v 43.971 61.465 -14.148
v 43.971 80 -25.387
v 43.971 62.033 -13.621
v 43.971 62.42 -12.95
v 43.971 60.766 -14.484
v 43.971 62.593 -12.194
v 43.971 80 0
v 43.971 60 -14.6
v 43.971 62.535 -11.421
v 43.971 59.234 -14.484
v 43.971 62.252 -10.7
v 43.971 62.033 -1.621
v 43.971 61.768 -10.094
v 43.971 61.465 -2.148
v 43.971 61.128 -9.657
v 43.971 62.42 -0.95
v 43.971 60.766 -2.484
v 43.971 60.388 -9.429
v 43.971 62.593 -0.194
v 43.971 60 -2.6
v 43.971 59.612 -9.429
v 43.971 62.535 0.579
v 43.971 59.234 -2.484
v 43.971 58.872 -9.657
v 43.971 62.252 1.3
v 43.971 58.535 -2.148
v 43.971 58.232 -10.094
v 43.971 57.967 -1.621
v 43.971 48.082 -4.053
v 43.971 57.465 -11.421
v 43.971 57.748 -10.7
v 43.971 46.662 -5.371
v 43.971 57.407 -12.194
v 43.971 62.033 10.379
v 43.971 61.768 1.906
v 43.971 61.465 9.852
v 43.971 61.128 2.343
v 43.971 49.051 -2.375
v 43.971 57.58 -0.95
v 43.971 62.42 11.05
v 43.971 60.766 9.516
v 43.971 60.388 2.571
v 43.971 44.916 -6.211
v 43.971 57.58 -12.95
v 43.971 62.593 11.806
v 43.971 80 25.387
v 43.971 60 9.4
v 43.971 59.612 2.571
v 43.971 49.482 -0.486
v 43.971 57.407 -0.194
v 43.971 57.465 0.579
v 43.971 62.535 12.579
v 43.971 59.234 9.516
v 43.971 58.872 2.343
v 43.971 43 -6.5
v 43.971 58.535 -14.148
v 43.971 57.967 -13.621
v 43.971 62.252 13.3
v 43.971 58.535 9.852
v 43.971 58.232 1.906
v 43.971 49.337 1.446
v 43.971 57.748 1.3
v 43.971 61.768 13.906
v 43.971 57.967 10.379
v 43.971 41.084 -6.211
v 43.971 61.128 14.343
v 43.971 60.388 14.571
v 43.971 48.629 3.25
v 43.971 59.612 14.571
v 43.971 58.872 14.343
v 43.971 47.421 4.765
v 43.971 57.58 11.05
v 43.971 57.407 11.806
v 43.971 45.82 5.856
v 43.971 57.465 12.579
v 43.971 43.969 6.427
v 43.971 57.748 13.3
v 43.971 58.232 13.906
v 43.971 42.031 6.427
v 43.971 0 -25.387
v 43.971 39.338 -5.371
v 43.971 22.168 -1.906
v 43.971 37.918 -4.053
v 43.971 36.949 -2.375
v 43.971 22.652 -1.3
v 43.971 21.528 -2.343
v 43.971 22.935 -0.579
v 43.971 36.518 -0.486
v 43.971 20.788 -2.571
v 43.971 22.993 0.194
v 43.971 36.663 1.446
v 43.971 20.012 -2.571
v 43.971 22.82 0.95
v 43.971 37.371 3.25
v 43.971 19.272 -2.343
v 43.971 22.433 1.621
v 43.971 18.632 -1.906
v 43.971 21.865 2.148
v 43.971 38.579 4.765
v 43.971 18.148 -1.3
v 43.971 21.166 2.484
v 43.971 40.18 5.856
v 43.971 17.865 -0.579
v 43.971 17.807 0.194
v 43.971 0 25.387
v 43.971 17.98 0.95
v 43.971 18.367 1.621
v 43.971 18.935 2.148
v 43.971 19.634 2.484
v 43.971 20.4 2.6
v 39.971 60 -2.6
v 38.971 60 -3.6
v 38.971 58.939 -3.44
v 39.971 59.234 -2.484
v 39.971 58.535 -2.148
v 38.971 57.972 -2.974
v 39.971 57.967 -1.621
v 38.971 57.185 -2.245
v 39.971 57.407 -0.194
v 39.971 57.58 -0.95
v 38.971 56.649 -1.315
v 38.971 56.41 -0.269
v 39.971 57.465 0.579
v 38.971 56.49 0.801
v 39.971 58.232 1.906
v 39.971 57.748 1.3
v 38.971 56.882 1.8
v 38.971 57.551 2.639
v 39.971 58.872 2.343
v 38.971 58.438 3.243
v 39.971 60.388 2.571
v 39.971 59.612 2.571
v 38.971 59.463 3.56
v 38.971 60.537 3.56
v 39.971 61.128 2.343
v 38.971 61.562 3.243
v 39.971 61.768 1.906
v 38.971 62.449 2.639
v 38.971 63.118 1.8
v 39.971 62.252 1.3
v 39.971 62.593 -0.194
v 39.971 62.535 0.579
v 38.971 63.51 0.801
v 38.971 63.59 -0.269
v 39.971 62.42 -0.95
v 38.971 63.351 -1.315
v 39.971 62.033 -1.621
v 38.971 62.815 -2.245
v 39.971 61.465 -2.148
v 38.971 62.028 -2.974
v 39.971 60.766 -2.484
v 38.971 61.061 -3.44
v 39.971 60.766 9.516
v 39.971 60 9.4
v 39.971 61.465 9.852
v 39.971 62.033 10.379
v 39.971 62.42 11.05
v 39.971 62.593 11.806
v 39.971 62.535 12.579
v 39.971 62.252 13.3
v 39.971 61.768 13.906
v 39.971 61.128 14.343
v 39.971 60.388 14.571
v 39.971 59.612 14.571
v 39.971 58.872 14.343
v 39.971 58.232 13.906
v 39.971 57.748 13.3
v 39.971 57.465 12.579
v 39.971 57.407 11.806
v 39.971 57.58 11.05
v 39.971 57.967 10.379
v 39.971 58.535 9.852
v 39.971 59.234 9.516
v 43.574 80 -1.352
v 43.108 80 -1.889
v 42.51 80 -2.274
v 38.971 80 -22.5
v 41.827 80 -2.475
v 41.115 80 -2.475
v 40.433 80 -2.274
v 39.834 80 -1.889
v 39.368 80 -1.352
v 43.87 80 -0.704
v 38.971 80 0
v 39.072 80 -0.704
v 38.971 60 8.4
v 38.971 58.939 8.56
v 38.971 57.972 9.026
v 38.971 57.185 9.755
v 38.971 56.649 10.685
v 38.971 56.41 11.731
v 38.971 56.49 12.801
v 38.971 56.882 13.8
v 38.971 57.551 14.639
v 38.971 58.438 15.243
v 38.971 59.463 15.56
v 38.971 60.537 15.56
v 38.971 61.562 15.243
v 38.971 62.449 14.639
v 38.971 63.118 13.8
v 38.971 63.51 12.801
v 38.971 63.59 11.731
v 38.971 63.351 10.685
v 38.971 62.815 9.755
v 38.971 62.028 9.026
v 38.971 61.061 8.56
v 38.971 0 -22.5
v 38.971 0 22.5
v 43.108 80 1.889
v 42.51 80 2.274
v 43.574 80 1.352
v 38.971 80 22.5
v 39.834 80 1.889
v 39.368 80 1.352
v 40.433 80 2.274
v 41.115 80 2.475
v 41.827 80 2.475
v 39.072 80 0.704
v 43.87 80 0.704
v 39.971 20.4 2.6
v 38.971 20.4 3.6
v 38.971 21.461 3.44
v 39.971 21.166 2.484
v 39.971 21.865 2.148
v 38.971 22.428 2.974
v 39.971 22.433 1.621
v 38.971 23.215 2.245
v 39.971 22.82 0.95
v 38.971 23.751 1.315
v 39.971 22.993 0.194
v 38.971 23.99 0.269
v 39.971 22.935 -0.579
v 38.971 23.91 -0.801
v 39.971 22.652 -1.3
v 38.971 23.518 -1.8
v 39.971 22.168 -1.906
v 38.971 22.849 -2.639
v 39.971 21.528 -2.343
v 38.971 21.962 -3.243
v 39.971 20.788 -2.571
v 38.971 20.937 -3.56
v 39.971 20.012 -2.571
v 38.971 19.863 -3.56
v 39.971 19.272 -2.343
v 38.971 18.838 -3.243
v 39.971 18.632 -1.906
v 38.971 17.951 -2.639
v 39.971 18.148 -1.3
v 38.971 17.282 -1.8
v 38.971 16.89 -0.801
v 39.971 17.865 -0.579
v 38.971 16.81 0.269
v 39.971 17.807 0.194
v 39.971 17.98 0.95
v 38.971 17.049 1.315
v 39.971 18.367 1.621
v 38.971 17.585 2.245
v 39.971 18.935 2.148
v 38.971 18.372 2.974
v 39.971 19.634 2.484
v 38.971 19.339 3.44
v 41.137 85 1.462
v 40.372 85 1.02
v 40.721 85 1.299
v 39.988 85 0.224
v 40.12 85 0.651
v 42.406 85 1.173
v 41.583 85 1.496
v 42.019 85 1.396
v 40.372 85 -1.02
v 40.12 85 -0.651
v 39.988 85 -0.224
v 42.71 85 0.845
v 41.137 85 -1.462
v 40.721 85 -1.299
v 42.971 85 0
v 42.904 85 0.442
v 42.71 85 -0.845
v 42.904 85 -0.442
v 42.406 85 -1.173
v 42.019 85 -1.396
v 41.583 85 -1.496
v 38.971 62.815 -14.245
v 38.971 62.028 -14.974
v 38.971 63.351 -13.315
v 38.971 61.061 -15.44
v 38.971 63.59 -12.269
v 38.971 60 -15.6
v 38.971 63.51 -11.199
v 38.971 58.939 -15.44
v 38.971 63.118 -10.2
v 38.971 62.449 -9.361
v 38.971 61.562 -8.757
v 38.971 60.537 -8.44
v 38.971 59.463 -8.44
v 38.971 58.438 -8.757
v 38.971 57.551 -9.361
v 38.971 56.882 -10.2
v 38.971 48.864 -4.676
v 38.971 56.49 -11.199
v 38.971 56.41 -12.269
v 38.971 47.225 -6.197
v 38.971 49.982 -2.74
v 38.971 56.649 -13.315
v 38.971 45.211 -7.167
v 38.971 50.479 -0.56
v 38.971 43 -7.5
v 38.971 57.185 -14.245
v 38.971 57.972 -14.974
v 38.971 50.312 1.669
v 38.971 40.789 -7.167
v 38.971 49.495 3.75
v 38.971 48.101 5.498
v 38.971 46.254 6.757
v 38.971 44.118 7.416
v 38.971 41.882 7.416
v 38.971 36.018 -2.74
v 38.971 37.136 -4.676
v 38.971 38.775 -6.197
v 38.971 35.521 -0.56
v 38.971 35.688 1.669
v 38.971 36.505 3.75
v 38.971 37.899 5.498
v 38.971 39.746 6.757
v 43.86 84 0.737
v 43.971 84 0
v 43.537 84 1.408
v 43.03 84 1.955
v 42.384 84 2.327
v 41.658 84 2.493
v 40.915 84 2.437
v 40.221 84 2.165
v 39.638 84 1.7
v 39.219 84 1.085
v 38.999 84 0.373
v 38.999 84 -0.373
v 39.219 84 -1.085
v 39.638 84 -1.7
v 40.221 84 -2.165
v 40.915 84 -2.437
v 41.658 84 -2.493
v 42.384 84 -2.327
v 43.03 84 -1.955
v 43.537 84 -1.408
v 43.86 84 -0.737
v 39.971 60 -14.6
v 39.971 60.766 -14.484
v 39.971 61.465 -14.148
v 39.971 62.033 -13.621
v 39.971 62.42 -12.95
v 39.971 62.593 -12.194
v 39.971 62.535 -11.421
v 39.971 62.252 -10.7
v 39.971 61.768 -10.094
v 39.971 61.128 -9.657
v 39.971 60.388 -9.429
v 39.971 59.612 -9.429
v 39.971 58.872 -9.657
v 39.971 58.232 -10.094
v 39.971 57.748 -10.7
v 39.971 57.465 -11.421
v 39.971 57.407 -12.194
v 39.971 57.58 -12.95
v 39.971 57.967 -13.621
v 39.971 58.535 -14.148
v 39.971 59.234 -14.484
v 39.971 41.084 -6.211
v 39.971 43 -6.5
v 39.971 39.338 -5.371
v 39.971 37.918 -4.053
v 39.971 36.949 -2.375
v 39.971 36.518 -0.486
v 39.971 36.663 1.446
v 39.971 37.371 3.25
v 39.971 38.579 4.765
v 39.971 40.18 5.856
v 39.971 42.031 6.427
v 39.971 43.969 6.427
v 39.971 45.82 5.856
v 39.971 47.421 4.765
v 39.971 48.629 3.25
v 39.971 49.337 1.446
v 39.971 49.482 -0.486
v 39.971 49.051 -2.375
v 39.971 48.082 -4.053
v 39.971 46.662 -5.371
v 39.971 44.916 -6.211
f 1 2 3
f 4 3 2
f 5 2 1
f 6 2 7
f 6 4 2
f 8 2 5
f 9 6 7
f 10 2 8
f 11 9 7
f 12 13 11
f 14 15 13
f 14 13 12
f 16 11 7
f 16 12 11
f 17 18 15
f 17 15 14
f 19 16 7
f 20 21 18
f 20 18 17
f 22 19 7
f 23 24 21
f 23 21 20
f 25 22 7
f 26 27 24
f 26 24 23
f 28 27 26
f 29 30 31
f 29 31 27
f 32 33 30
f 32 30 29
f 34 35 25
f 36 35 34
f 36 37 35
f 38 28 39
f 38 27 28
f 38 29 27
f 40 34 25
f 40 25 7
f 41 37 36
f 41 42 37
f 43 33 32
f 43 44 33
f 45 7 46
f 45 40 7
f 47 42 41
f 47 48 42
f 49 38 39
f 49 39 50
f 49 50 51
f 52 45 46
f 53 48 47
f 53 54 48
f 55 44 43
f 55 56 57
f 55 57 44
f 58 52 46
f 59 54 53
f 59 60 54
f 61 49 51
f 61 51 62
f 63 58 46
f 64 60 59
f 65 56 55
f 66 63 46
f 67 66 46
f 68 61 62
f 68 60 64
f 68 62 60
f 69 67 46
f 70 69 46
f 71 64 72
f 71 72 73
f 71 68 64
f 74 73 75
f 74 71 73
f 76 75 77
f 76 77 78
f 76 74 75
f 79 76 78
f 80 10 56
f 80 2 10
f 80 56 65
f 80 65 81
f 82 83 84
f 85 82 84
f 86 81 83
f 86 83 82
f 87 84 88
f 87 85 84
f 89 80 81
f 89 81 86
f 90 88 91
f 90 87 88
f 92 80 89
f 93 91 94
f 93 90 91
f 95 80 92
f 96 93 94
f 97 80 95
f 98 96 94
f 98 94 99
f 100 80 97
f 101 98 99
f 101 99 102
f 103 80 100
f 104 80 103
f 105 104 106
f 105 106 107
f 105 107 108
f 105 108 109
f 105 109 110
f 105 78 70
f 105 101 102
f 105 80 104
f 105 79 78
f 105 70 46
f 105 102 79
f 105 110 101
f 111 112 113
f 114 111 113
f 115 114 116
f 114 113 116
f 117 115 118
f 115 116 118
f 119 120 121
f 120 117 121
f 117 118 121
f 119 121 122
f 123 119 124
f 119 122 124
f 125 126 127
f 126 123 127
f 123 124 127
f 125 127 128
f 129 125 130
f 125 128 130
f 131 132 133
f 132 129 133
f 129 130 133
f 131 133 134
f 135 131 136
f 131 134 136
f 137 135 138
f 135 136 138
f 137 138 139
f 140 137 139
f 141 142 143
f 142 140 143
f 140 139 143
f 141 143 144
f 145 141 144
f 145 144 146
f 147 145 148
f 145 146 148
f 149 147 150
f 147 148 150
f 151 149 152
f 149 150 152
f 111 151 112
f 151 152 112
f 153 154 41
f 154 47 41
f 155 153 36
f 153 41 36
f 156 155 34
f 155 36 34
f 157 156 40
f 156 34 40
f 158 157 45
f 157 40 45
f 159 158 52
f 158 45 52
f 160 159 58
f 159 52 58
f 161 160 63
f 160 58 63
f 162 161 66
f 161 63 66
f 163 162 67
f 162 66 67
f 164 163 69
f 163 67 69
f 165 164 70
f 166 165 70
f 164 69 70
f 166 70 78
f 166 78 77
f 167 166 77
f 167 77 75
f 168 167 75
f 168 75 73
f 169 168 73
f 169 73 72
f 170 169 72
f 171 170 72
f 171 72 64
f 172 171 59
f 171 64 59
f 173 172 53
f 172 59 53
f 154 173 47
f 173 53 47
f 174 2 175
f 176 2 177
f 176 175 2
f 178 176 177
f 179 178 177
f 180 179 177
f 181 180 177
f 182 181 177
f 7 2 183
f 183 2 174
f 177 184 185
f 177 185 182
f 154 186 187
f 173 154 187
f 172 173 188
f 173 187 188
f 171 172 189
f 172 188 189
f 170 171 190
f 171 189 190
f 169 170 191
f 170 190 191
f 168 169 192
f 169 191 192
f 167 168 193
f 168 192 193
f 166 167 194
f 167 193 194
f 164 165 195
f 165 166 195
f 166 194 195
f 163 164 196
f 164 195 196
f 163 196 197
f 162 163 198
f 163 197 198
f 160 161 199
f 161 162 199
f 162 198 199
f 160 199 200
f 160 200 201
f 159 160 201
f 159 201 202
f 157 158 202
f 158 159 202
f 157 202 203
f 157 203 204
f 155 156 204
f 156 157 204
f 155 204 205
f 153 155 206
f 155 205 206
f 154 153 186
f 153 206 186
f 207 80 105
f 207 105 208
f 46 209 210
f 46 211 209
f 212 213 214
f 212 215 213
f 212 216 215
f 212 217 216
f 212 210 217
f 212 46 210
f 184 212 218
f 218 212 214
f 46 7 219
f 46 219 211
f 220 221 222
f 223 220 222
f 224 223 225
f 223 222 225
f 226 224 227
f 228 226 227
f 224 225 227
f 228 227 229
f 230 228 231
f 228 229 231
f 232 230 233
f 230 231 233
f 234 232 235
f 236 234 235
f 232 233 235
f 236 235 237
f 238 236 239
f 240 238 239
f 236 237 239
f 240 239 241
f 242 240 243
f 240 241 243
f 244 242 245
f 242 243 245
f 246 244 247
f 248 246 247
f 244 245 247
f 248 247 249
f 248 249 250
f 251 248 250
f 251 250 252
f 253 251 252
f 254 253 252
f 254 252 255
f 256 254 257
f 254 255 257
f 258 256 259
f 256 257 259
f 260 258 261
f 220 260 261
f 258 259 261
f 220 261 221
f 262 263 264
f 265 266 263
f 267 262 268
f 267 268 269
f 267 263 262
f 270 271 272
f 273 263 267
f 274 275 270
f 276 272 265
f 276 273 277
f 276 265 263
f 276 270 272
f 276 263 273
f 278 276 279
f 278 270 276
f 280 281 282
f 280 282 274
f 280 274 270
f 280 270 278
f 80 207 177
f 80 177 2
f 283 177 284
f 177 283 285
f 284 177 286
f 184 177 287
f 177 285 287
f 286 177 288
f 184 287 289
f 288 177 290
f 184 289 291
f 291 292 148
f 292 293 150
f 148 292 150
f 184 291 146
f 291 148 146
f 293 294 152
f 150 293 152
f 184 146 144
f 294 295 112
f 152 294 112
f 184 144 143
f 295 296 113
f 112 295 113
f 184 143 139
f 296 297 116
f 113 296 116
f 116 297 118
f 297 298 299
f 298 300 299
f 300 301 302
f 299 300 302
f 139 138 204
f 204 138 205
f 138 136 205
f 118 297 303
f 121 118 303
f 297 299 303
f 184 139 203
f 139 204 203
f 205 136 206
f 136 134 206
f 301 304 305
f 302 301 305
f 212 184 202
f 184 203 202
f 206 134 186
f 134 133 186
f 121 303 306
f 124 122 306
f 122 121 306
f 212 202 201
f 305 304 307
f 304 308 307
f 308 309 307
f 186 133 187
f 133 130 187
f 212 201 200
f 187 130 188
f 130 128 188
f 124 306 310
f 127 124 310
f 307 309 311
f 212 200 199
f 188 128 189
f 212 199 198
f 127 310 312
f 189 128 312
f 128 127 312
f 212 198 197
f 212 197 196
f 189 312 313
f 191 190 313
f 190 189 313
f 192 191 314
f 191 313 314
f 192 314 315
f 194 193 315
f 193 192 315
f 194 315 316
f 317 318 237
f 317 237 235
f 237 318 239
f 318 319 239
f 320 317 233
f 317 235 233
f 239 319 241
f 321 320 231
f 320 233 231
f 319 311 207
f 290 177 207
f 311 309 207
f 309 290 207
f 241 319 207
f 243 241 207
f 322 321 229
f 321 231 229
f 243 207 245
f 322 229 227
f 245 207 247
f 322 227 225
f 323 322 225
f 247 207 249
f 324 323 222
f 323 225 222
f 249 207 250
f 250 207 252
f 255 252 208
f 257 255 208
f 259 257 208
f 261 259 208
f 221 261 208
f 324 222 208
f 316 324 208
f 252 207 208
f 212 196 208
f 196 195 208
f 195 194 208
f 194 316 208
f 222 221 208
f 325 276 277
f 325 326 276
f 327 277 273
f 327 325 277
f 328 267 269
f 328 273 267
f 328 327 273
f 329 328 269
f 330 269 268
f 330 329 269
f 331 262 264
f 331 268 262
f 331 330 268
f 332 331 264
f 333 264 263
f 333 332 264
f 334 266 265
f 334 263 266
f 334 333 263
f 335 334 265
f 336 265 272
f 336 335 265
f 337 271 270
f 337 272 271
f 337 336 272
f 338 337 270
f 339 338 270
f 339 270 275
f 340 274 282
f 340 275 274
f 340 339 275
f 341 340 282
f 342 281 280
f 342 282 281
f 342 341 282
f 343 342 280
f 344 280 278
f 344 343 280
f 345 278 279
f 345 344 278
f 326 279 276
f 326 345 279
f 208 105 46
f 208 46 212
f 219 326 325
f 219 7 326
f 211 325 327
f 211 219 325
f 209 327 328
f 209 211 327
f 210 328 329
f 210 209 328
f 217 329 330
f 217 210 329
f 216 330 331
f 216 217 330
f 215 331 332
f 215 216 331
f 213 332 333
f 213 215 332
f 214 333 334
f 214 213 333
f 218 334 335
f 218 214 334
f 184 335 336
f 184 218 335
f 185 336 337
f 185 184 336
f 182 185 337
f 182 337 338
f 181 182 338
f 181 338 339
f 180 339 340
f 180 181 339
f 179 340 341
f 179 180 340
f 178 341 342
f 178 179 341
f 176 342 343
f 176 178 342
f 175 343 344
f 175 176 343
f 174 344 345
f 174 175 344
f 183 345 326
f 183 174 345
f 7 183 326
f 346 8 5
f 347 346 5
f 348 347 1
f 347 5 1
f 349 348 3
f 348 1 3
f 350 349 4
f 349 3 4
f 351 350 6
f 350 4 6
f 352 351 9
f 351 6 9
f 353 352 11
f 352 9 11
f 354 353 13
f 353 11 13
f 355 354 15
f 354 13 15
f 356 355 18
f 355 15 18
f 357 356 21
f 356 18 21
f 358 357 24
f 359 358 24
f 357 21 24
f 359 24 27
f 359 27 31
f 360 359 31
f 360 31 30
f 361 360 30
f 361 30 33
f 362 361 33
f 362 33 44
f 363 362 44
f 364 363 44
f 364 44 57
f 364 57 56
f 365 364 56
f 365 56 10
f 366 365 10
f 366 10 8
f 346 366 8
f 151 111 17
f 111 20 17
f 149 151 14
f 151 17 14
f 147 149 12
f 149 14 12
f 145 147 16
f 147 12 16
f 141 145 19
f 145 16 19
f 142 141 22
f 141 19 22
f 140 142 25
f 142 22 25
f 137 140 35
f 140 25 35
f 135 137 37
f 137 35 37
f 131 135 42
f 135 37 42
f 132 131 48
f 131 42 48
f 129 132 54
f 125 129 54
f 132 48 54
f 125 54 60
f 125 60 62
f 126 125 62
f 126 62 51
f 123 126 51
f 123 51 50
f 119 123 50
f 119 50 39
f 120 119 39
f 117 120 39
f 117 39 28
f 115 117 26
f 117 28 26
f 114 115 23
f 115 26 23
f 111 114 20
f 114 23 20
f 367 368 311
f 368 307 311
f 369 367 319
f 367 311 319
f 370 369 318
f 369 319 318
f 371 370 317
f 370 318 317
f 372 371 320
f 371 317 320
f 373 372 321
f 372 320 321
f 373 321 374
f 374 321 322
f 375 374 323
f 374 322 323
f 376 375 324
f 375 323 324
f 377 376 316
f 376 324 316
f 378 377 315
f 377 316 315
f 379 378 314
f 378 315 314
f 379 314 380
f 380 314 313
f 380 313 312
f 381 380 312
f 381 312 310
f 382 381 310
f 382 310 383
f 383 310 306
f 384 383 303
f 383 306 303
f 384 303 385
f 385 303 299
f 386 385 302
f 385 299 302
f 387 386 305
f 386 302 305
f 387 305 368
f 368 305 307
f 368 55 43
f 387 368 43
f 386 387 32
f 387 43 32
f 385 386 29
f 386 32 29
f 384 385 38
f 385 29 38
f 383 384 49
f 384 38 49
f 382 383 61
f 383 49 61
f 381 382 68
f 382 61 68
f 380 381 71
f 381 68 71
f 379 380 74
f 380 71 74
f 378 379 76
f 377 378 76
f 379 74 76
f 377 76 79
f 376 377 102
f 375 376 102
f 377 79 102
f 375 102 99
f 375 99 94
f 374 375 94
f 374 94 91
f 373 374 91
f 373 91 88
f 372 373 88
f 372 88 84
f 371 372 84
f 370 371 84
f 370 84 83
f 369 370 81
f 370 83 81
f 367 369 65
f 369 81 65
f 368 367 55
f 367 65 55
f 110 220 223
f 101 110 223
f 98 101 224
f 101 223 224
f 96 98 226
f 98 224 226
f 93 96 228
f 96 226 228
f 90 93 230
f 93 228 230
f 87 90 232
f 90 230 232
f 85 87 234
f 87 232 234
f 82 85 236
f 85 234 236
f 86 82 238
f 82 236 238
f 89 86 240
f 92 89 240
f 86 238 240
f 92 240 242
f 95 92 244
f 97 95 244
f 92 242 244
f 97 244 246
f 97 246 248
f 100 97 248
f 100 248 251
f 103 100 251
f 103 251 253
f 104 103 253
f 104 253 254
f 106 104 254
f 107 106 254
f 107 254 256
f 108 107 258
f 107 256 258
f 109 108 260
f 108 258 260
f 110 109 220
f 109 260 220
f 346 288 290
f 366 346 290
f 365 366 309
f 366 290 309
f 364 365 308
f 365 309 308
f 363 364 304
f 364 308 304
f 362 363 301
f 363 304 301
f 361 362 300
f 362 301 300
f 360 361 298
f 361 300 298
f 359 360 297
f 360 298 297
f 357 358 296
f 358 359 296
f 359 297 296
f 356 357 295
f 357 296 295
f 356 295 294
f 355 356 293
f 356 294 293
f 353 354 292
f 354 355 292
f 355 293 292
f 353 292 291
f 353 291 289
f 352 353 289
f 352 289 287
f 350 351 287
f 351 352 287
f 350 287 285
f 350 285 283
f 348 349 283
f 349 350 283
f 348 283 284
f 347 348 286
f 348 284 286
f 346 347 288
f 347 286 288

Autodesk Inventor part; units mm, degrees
ref_plane "YZ Plane" through (0, 0, 0) normal (1, 0, 0) x (0, 1, 0)
ref_plane "XZ Plane" through (0, 0, 0) normal (0, 1, 0) x (-1, 0, 0)
ref_plane "XY Plane" through (0, 0, 0) normal (0, 0, 1) x (1, 0, 0)
sketch "스케치2" plane through (0, 0, 0) normal (0, 1, 0) x (-1, 0, 0)
  line L0 (0, 45) -> (38.9711, 22.5)
  line L1 (38.9711, 22.5) -> (38.9711, -22.5)
  line L2 (38.9711, -22.5) -> (0, -45)
  line L3 (0, -45) -> (-38.9711, -22.5)
  line L4 (-38.9711, -22.5) -> (-38.9711, 22.5)
  line L5 (-38.9711, 22.5) -> (0, 45)
  line L6 (0, 50.7735) -> (43.9711, 25.3868)
  line L7 (43.9711, 25.3868) -> (43.9711, -25.3868)
  line L8 (43.9711, -25.3868) -> (0, -50.7735)
  line L9 (0, -50.7735) -> (-43.9711, -25.3868)
  line L10 (-43.9711, -25.3868) -> (-43.9711, 25.3868)
  line L11 (-43.9711, 25.3868) -> (0, 50.7735)
  line L12 (-43.9711, 25.3868) -> (-38.9711, 22.5)
  line L13 (-38.9711, -22.5) -> (-43.9711, -25.3868)
  point P0 (0, 0)
  point P1 (0, 0)
  dimension "d0" = 45
  dimension "d1" = 5
extrude "돌출1" add sketch "스케치2" along normal blind 80 contours L4 L13 L10 L12
sketch "스케치3" plane through (38.9711, 0, -22.5) normal (-1, 0, 0) x (0, 0, 1)
  line L0 (0, 0) -> (45, 0) construction
  circle A0 centre (22.5, 20.4) radius 2.6
  point P0 (22.5, 0)
  point P1 (22.5, 0)
  dimension "d4" = 5.2
  dimension "d5" = 20.4
extrude "돌출2" cut sketch "스케치3" against normal through all
sketch "스케치4" plane through (0, 80, 0) normal (0, 1, 0) x (1, 0, 0)
  line L0 (38.9711, 22.5) -> (38.9711, -22.5) construction
  circle A0 centre (41.4711, 0) radius 2.5
  point P0 (0, 0)
  dimension "d8" = 5
extrude "돌출3" add sketch "스케치4" along normal blind 5
sketch "스케치5" plane through (43.9711, 0, 25.3868) normal (1, 0, 0) x (0, 0, -1)
  line L0 (50.7735, 0) -> (50.7735, 80) construction
  line L1 (25.3868, 80) -> (50.7735, 80) construction
  line L2 (0, 0) -> (0, 80) construction
  circle A0 centre (25.3868, 60) radius 2.6
  circle A1 centre (13.3868, 60) radius 2.6
  circle A2 centre (37.3868, 60) radius 2.6
  line L3 (0, 60) -> (50.7735, 60)
  point P0 (25.3868, 0)
  dimension "d11" = 20
  dimension "d12" = 0
  dimension "d13" = 0
  dimension "d14" = 0
  dimension "d15" = 12
  dimension "d16" = 12
  dimension "d17" = 5.2
  dimension "d18" = 5.2
  dimension "d19" = 5.2
extrude "돌출4" cut sketch "스케치5" against normal through all
sketch "스케치6" plane through (43.9711, 0, 25.3868) normal (1, 0, 0) x (0, 0, -1)
  line L0 (0, 0) -> (50.7735, 0) construction
  circle A0 centre (25.3868, 43) radius 6.5
  point P0 (25.3868, 0)
  dimension "d22" = 13
  dimension "d23" = 43
extrude "돌출5" cut sketch "스케치6" against normal through all
chamfer "모따기1" distance 1 angle 45 6 edges at (38.9711, 85, 0) (38.9711, 60, -9.4) (38.9711, 60, 2.6) (38.9711, 60, 14.6) (38.9711, 43, 6.5) (38.9711, 20.4, -2.6)
properties part number "col_face"
